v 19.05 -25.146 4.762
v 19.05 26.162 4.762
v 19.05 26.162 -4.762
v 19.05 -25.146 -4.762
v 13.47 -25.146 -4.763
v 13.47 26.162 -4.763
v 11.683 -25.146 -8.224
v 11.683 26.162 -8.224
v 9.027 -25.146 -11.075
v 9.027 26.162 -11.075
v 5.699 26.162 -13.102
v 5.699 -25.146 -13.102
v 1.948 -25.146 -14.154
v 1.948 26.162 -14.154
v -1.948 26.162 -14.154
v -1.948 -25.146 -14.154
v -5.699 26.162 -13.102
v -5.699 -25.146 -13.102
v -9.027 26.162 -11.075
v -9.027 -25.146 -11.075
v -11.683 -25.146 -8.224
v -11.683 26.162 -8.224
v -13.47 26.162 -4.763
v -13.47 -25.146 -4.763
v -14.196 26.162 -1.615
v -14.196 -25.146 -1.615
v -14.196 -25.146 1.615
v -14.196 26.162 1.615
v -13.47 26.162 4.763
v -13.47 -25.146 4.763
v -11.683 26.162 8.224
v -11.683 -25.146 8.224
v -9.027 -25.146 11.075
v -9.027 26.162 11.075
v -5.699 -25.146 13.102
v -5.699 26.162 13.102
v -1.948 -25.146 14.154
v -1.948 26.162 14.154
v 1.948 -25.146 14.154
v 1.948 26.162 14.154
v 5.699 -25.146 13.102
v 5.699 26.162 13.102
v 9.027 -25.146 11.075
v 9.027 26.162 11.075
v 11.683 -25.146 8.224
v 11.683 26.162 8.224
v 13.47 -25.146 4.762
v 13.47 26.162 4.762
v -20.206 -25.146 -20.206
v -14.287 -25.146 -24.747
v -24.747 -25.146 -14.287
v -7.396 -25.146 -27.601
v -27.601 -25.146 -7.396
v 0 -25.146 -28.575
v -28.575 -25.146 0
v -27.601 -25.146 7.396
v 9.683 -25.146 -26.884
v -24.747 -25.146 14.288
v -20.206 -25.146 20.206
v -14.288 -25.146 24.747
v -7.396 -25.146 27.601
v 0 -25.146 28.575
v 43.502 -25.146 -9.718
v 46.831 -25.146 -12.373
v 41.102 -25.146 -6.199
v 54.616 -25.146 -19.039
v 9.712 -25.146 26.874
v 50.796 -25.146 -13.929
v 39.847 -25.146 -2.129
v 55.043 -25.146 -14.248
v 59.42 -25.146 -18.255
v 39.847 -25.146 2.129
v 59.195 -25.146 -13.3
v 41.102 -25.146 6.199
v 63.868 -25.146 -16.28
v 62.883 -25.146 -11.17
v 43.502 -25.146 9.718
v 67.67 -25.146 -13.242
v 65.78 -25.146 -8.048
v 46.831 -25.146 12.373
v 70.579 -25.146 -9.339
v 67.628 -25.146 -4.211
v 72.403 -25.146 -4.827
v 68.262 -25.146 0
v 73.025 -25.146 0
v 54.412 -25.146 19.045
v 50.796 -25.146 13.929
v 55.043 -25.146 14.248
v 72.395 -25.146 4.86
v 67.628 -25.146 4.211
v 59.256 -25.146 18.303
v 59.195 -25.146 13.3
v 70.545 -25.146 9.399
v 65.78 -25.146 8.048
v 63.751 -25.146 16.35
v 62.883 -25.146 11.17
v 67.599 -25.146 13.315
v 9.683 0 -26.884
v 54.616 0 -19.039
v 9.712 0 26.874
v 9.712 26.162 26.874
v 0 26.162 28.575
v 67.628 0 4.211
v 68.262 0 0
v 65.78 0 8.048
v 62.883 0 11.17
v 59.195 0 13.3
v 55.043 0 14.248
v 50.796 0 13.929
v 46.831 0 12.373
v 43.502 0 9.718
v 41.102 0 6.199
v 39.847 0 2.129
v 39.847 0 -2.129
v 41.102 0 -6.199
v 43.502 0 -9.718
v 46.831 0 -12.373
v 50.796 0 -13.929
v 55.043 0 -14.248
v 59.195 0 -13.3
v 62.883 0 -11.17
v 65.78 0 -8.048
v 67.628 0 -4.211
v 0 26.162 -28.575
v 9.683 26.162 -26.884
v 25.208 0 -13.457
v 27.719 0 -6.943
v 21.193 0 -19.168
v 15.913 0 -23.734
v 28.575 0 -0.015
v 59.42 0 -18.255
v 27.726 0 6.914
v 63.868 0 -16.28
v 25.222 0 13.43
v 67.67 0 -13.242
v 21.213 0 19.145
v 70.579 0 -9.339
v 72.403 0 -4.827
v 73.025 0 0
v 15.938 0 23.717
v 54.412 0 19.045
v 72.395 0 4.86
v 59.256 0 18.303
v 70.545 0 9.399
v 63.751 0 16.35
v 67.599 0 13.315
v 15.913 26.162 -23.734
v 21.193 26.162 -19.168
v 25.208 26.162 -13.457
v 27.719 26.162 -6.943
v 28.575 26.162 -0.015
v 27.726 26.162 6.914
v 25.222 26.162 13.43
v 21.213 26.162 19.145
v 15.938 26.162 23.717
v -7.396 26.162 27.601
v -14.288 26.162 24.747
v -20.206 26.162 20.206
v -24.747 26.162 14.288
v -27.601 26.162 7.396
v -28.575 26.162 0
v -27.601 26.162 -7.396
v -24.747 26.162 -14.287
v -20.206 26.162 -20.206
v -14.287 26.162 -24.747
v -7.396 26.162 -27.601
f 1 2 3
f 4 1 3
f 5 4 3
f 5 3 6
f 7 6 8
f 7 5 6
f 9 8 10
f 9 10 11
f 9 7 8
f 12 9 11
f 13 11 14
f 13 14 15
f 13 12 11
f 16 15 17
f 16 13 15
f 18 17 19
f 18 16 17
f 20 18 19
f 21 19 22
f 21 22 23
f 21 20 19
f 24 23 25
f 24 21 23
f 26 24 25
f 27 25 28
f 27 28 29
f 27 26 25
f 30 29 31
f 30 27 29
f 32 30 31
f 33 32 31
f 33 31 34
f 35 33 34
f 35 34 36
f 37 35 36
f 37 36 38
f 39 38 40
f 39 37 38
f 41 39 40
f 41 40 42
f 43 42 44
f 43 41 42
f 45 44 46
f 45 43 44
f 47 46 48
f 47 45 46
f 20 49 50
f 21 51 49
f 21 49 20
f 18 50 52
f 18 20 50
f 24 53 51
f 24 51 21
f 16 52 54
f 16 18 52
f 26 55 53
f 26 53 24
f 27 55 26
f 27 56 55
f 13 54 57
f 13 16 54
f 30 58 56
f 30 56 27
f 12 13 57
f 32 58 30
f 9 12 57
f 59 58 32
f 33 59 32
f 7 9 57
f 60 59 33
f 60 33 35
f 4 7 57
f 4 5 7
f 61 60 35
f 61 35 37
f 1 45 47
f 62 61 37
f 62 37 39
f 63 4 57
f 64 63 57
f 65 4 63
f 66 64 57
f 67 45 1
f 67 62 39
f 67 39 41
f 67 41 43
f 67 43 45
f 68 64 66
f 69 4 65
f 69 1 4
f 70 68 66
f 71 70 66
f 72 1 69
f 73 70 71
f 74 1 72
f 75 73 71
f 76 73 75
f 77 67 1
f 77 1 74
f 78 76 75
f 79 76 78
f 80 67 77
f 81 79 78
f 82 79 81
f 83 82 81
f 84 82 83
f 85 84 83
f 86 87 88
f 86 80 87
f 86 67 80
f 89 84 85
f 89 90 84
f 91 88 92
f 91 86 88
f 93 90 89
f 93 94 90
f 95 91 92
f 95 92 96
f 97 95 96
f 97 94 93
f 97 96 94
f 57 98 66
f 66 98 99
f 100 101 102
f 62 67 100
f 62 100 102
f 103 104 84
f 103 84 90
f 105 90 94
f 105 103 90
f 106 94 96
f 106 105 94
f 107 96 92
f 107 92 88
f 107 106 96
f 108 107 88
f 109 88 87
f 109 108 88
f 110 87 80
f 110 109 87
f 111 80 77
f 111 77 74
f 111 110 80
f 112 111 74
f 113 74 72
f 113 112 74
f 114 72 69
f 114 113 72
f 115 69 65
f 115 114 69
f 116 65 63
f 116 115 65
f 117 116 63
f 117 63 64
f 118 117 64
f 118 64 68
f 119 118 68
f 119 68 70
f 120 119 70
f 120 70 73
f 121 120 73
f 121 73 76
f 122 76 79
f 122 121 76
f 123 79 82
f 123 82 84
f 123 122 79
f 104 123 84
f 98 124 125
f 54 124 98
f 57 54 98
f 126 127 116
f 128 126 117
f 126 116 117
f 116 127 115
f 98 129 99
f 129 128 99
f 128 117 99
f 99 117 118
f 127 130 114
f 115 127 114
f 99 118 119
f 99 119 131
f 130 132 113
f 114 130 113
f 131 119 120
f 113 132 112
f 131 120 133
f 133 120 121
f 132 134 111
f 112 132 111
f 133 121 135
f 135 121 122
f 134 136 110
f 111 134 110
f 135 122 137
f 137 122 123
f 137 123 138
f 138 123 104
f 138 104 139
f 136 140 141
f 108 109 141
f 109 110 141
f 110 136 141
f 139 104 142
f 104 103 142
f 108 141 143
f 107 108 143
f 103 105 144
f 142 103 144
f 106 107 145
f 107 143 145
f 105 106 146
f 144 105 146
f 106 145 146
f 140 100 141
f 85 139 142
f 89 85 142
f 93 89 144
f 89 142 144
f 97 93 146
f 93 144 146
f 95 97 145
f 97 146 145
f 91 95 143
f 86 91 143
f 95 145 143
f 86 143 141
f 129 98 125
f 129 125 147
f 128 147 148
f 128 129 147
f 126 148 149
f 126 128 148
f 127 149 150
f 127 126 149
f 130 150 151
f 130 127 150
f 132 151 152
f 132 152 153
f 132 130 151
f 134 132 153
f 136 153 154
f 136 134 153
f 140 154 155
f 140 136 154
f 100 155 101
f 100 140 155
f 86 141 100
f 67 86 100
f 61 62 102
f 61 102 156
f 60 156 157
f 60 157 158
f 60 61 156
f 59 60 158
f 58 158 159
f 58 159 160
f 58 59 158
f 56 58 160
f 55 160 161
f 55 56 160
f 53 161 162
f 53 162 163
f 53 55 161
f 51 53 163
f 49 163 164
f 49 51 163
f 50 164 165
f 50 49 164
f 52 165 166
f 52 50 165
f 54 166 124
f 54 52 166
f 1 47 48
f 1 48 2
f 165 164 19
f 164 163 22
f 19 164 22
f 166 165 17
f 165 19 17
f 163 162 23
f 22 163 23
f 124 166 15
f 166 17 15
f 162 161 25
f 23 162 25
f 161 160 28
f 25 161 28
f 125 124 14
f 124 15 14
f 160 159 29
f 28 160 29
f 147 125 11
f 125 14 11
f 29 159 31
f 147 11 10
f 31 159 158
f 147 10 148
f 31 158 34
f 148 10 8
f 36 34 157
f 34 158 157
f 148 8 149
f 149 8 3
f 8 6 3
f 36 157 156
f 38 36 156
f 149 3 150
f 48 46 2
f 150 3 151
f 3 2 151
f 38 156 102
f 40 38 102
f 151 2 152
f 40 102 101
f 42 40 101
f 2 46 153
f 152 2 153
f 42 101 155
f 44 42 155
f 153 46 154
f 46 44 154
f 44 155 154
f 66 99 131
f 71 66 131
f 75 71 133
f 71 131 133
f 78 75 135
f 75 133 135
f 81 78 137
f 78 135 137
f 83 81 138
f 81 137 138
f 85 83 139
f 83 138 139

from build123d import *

# Parameters (mm, degrees)
F0_R     = 14.2875
F1_DEPTH = 25.146
F2_DEPTH = 26.162


with BuildPart() as f1:
    # F0 (on Front) → F1 (new body)
    with BuildSketch(Plane.XZ):
        with BuildLine():
            Line((9.7116618994, 26.8740441347), (0, 28.575))
            ThreePointArc((0, 28.575), (-28.575, 0), (0, -28.575))
            Line((0, -28.575), (9.6830426125, -26.8843692648))
            ThreePointArc((9.6830426125, -26.8843692648), (23.3797301915, -16.4292069551), (28.575, 0))
            ThreePointArc((28.575, 0), (23.3884732697, 16.4167579964), (9.7116618994, 26.8740441347))
        make_face()
        with BuildLine():
            ThreePointArc((-13.4703841816, 4.7625), (0, 14.2875), (13.4703841816, 4.7625))
            Line((13.4703841816, 4.7625), (19.05, 4.7625))
            Line((19.05, 4.7625), (19.05, -4.7625))
            Line((19.05, -4.7625), (13.4703841816, -4.7625))
            ThreePointArc((13.4703841816, -4.7625), (0, -14.2875), (-13.4703841816, -4.7625))
            Line((-13.4703841816, -4.7625), (-19.05, -4.7625))
            Line((-19.05, -4.7625), (-19.05, 4.7625))
            Line((-19.05, 4.7625), (-13.4703841816, 4.7625))
        make_face(mode=Mode.SUBTRACT)
        with BuildLine():
            Line((54.4119007606, 19.0449893076), (9.7116618994, 26.8740441347))
            ThreePointArc((9.7116618994, 26.8740441347), (23.3884732697, 16.4167579964), (28.575, 0))
            ThreePointArc((28.575, 0), (23.3797301915, -16.4292069551), (9.6830426125, -26.8843692648))
            Line((9.6830426125, -26.8843692648), (54.6159610506, -19.0392139788))
            ThreePointArc((54.6159610506, -19.0392139788), (34.9252734531, -0.1020710003), (54.4119007606, 19.0449893076))
        make_face()
        with BuildLine():
            ThreePointArc((73.025, 0), (67.5989762825, 13.3150204752), (54.4119007606, 19.0449893076))
            ThreePointArc((54.4119007606, 19.0449893076), (34.9252734531, -0.1020710003), (54.6159610506, -19.0392139788))
            ThreePointArc((54.6159610506, -19.0392139788), (67.6701233659, -13.241831293), (73.025, 0))
        make_face()
        with Locations((53.975, 0)):
            Circle(F0_R, mode=Mode.SUBTRACT)
        with BuildLine():
            ThreePointArc((-13.4703841816, -4.7625), (-14.2875, 0), (-13.4703841816, 4.7625))
            Line((-13.4703841816, 4.7625), (-19.05, 4.7625))
            Line((-19.05, 4.7625), (-19.05, -4.7625))
            Line((-19.05, -4.7625), (-13.4703841816, -4.7625))
        make_face()
    extrude(amount=F1_DEPTH)

    # F0 (on Front) → F2 (join)
    with BuildSketch(Plane.XZ):
        with BuildLine():
            Line((9.7116618994, 26.8740441347), (0, 28.575))
            ThreePointArc((0, 28.575), (-28.575, 0), (0, -28.575))
            Line((0, -28.575), (9.6830426125, -26.8843692648))
            ThreePointArc((9.6830426125, -26.8843692648), (23.3797301915, -16.4292069551), (28.575, 0))
            ThreePointArc((28.575, 0), (23.3884732697, 16.4167579964), (9.7116618994, 26.8740441347))
        make_face()
        with BuildLine():
            ThreePointArc((-13.4703841816, 4.7625), (0, 14.2875), (13.4703841816, 4.7625))
            Line((13.4703841816, 4.7625), (19.05, 4.7625))
            Line((19.05, 4.7625), (19.05, -4.7625))
            Line((19.05, -4.7625), (13.4703841816, -4.7625))
            ThreePointArc((13.4703841816, -4.7625), (0, -14.2875), (-13.4703841816, -4.7625))
            Line((-13.4703841816, -4.7625), (-19.05, -4.7625))
            Line((-19.05, -4.7625), (-19.05, 4.7625))
            Line((-19.05, 4.7625), (-13.4703841816, 4.7625))
        make_face(mode=Mode.SUBTRACT)
        with BuildLine():
            ThreePointArc((-13.4703841816, -4.7625), (-14.2875, 0), (-13.4703841816, 4.7625))
            Line((-13.4703841816, 4.7625), (-19.05, 4.7625))
            Line((-19.05, 4.7625), (-19.05, -4.7625))
            Line((-19.05, -4.7625), (-13.4703841816, -4.7625))
        make_face()
    extrude(amount=-F2_DEPTH)


solid = f1.part
